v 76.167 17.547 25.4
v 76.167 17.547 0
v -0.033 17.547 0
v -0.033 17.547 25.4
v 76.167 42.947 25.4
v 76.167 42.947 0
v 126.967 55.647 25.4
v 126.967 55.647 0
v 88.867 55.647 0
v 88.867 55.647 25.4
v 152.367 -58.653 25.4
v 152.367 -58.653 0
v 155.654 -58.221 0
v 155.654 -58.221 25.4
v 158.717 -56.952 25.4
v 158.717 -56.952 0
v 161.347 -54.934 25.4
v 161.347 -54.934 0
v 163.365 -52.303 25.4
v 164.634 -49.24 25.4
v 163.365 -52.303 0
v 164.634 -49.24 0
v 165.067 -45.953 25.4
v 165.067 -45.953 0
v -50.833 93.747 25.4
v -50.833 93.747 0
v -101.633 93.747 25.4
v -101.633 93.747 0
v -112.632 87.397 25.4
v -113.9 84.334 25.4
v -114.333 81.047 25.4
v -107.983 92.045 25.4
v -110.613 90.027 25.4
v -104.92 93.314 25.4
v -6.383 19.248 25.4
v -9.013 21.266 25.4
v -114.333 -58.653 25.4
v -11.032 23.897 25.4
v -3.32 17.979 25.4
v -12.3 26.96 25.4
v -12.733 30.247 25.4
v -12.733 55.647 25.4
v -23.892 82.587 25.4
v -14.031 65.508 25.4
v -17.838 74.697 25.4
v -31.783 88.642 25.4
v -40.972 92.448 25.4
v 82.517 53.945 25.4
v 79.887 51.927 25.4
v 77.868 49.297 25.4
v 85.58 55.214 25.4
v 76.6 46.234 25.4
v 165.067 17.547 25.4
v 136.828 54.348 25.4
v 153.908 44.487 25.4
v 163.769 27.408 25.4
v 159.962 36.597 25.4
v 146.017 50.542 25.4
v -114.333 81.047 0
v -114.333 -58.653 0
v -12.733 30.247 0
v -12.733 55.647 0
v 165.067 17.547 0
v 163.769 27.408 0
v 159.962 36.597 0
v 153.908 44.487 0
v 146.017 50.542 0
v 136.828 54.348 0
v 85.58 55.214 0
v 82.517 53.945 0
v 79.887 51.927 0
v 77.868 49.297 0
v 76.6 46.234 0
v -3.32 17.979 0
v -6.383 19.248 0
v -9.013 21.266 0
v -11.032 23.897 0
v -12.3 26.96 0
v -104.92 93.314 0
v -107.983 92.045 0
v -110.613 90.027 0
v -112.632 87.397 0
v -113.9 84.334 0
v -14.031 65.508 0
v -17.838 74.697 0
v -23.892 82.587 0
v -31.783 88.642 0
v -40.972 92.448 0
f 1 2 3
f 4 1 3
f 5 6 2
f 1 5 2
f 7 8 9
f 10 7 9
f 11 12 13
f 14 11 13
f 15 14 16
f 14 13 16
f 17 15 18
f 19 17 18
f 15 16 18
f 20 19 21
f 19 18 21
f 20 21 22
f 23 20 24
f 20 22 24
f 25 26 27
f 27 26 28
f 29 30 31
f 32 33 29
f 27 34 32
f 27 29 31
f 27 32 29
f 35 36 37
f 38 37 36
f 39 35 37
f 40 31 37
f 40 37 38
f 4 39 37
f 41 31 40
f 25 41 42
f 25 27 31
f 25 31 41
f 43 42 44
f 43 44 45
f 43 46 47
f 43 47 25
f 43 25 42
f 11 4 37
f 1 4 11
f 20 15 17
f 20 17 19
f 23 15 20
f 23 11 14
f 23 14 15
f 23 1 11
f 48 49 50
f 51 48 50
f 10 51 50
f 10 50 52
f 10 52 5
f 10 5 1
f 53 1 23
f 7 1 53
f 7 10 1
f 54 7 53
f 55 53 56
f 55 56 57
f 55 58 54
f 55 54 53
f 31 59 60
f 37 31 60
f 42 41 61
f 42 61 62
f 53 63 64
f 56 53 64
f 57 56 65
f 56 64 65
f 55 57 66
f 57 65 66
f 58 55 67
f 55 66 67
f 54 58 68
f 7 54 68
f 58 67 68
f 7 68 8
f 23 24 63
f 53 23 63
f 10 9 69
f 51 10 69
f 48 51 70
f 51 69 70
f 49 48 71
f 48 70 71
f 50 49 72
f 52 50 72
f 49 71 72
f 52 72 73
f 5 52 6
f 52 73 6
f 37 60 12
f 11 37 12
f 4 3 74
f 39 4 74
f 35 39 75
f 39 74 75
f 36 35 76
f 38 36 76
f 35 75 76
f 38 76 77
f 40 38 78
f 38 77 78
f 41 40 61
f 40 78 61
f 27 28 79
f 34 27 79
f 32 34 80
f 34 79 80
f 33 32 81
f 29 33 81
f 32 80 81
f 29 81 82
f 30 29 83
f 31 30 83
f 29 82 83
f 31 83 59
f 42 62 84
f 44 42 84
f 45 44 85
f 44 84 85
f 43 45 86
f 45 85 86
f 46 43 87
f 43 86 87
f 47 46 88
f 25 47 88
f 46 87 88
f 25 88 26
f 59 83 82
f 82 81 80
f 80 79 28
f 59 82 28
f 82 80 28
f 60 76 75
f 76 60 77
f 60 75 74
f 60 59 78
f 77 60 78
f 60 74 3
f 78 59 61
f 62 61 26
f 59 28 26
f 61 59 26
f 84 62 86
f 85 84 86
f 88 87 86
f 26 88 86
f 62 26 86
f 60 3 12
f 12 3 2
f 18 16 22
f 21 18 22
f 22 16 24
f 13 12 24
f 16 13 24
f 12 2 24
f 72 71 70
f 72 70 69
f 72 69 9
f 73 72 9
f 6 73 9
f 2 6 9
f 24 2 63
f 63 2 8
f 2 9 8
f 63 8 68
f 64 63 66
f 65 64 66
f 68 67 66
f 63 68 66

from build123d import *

# Parameters (mm, degrees)
F1_DEPTH = 25.4


with BuildPart() as f1:
    # F0 (on Top) → F1 (new body)
    with BuildSketch(Plane.XY):
        with BuildLine():
            Line((-114.333168, 81.04653), (-114.333168, -58.65347))
            Line((-114.333168, -58.65347), (152.366832, -58.65347))
            ThreePointArc((152.366832, -58.65347), (161.347088, -54.933726), (165.066832, -45.95347))
            Line((165.066832, -45.95347), (165.066832, 17.54653))
            ThreePointArc((165.066832, 17.54653), (153.907601, 44.487298), (126.966832, 55.64653))
            Line((126.966832, 55.64653), (88.866832, 55.64653))
            ThreePointArc((88.866832, 55.64653), (79.886576, 51.926786), (76.166832, 42.94653))
            Line((76.166832, 42.94653), (76.166832, 17.54653))
            Line((76.166832, 17.54653), (-0.033168, 17.54653))
            ThreePointArc((-0.033168, 17.54653), (-9.013424, 21.266274), (-12.733168, 30.24653))
            Line((-12.733168, 30.24653), (-12.733168, 55.64653))
            ThreePointArc((-12.733168, 55.64653), (-23.892399, 82.587298), (-50.833168, 93.74653))
            Line((-50.833168, 93.74653), (-101.633168, 93.74653))
            ThreePointArc((-101.633168, 93.74653), (-110.613424, 90.026786), (-114.333168, 81.04653))
        make_face()
    extrude(amount=F1_DEPTH)


solid = f1.part
